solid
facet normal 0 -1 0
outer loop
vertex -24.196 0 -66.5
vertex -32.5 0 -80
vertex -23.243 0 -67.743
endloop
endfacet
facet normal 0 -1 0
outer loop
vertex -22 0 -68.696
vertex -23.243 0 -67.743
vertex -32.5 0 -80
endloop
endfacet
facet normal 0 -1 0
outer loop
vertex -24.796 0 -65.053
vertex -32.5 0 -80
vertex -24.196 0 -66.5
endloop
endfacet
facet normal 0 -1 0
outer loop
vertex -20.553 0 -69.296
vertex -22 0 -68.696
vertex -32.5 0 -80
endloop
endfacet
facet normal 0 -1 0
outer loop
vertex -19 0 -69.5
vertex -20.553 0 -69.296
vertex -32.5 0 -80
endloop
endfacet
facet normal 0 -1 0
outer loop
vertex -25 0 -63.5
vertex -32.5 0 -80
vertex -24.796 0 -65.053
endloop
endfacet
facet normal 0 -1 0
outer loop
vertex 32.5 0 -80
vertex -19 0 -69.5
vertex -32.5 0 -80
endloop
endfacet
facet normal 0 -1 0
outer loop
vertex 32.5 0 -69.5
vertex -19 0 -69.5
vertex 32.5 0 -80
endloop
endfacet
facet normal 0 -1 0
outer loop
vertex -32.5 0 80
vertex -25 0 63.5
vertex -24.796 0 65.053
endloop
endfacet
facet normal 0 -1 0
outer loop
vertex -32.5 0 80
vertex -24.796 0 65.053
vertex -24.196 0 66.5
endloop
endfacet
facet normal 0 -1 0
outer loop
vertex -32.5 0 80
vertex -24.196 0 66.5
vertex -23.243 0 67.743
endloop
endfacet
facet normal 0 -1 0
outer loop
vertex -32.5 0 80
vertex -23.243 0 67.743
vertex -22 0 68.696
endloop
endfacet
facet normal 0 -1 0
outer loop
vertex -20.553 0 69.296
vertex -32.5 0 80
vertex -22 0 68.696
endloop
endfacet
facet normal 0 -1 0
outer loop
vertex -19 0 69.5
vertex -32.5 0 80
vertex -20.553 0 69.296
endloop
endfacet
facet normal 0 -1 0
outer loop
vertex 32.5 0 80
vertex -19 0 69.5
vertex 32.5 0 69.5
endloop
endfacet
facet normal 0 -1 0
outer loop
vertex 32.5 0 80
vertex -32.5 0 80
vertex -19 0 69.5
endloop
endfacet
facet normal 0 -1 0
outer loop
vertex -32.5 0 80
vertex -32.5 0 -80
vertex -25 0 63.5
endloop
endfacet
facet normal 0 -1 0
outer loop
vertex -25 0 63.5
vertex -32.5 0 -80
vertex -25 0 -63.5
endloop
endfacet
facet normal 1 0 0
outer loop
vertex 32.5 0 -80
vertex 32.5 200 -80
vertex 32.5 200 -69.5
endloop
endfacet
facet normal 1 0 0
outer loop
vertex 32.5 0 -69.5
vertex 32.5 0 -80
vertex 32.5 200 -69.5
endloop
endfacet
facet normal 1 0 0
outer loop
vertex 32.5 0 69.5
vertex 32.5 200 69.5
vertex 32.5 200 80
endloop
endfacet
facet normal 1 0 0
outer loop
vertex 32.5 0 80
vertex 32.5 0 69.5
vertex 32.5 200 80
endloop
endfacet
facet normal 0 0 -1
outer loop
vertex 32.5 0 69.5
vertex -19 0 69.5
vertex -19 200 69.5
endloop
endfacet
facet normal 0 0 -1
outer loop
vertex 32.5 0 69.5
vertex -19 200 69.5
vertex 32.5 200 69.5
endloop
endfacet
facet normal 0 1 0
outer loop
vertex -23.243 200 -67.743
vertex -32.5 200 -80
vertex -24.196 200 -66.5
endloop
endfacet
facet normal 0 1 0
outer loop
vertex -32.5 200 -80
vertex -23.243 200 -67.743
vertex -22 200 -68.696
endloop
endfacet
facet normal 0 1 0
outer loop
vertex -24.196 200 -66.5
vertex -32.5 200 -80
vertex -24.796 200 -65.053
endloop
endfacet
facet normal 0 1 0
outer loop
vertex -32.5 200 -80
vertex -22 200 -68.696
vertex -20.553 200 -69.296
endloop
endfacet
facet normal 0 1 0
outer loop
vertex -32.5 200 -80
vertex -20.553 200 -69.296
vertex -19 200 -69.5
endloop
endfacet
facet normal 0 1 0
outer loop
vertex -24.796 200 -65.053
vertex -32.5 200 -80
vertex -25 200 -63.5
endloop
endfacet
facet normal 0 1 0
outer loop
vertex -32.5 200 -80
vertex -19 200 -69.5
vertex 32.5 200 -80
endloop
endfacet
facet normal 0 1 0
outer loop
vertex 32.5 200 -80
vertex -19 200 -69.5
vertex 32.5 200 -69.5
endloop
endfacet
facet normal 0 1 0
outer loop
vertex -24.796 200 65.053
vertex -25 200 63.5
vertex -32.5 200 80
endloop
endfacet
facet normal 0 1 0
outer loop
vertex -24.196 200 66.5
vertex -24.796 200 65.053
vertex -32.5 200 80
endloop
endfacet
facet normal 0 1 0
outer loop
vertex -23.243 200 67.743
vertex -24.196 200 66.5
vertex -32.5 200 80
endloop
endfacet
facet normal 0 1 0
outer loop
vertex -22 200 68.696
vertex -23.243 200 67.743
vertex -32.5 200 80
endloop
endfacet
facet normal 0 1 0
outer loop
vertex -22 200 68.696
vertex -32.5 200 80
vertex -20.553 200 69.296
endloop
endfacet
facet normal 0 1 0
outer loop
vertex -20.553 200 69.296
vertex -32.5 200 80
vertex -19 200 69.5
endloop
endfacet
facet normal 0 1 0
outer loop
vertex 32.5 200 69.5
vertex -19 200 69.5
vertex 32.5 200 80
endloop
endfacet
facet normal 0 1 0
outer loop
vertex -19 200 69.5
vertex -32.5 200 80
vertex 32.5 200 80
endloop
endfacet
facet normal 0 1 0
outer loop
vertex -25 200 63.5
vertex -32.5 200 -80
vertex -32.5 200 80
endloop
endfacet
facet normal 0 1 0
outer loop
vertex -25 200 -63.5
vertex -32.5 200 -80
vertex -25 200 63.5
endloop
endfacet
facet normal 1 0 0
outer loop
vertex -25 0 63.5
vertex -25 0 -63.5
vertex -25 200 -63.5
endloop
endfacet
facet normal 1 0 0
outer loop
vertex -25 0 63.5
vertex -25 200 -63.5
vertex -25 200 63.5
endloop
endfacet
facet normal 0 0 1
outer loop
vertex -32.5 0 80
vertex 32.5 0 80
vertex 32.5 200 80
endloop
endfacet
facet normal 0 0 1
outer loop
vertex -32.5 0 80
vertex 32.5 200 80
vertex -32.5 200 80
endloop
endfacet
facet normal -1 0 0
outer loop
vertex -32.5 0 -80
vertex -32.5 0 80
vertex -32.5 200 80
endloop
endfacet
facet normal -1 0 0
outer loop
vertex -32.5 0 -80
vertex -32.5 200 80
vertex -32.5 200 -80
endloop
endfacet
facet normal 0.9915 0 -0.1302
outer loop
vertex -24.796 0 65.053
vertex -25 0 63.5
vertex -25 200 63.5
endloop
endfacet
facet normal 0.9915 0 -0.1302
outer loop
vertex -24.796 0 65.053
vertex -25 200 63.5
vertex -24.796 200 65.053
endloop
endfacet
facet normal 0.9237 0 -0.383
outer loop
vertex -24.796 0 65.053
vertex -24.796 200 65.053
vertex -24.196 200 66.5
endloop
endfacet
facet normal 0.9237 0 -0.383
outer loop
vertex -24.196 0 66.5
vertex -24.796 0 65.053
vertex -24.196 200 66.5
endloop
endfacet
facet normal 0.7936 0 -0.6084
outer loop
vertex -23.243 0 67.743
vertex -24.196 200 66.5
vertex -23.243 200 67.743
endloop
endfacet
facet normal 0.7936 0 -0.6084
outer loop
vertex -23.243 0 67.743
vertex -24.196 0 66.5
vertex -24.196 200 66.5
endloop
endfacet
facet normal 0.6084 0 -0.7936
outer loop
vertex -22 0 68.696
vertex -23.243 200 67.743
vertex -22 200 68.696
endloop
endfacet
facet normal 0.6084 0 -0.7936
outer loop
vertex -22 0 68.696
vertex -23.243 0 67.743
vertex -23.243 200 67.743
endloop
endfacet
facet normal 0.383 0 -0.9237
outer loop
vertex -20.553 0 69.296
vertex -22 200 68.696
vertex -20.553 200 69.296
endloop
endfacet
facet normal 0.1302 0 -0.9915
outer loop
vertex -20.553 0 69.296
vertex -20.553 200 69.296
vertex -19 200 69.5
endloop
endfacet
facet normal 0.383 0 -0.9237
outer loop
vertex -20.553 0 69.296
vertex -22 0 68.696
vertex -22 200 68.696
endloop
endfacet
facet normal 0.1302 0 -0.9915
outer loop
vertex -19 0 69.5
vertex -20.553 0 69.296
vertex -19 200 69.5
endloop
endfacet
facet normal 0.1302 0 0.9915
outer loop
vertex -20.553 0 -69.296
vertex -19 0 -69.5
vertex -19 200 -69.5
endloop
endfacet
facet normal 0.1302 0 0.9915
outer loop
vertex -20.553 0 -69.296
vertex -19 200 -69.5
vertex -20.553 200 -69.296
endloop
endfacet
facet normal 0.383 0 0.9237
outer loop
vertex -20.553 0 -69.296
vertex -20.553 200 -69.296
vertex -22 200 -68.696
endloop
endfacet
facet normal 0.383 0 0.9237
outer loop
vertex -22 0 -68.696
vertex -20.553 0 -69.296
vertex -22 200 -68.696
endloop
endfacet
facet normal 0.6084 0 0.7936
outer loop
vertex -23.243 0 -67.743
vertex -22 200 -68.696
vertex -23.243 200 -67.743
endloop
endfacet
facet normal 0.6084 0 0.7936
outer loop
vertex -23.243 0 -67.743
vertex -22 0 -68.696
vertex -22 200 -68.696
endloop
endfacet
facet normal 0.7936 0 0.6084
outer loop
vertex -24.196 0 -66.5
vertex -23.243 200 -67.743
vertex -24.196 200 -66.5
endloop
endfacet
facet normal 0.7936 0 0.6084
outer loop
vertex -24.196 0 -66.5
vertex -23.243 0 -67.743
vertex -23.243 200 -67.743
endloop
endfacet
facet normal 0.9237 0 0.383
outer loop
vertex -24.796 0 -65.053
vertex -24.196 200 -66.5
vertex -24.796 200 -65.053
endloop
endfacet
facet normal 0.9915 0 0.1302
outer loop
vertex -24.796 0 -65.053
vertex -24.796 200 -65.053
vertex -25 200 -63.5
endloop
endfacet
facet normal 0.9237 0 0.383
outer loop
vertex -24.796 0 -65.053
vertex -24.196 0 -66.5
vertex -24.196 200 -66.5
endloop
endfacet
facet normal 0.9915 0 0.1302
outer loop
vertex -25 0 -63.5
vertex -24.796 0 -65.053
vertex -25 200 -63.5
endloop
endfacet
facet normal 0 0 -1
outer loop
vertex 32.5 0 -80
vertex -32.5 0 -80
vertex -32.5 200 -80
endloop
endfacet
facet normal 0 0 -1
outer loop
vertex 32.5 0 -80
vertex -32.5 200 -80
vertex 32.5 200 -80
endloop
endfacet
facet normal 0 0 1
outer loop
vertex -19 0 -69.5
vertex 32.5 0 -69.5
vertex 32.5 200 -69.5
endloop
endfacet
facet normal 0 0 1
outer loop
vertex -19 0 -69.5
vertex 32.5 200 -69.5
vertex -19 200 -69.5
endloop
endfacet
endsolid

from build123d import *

# Parameters (mm, degrees)
F1_DEPTH = 200


with BuildPart() as f1:
    # F0 (on Front) → F1 (new body)
    with BuildSketch(Plane.XZ):
        with BuildLine():
            Line((32.5, 69.5), (32.5, 80))
            Line((32.5, 80), (-32.5, 80))
            Line((-32.5, 80), (-32.5, -80))
            Line((-32.5, -80), (32.5, -80))
            Line((32.5, -80), (32.5, -69.5))
            Line((32.5, -69.5), (-19, -69.5))
            ThreePointArc((-19, -69.5), (-23.242641, -67.742641), (-25, -63.5))
            Line((-25, -63.5), (-25, 63.5))
            ThreePointArc((-25, 63.5), (-23.242641, 67.742641), (-19, 69.5))
            Line((-19, 69.5), (32.5, 69.5))
        make_face()
    extrude(amount=-F1_DEPTH)


solid = f1.part
